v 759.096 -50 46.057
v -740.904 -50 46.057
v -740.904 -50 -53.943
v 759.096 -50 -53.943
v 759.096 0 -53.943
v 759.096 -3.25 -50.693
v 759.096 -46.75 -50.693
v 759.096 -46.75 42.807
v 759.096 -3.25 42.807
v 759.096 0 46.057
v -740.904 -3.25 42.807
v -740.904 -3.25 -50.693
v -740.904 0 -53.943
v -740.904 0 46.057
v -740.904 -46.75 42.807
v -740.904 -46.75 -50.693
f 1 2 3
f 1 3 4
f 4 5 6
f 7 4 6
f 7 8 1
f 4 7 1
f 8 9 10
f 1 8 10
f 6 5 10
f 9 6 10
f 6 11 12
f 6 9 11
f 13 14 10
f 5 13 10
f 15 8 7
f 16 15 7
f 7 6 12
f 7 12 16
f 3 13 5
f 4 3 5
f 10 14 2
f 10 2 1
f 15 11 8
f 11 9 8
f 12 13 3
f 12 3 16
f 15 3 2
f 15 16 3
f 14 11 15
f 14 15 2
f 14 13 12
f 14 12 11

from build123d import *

# Parameters (mm, degrees)
F0_W          = 1500
F0_H          = 100
F1_DEPTH      = 50
F2_T          = -3.25
F3_DEPTH      = 25
F3_DEPTH_BACK = 25


with BuildPart() as f1:
    # F0 (on Front) → F1 (new body)
    with BuildSketch(Plane.XZ):
        with Locations((9.0955580262, -3.9434796199)):
            Rectangle(F0_W, F0_H)
    extrude(amount=F1_DEPTH)

    # F2
    f2_openings = [f1.faces().sort_by_distance(p)[0] for p in [
        (759.095558, -25, -3.94348),
    ]]
    offset(amount=F2_T, openings=f2_openings)

    # F3 (cut, two sides): a face of the model
    f3_faces = [f1.faces().sort_by_distance(p)[0] for p in [
        (-737.6544419738, -25, -3.9434796199),
    ]]
    extrude(f3_faces, amount=-F3_DEPTH, mode=Mode.SUBTRACT)
    extrude(f3_faces, amount=F3_DEPTH_BACK, mode=Mode.SUBTRACT)


solid = f1.part
